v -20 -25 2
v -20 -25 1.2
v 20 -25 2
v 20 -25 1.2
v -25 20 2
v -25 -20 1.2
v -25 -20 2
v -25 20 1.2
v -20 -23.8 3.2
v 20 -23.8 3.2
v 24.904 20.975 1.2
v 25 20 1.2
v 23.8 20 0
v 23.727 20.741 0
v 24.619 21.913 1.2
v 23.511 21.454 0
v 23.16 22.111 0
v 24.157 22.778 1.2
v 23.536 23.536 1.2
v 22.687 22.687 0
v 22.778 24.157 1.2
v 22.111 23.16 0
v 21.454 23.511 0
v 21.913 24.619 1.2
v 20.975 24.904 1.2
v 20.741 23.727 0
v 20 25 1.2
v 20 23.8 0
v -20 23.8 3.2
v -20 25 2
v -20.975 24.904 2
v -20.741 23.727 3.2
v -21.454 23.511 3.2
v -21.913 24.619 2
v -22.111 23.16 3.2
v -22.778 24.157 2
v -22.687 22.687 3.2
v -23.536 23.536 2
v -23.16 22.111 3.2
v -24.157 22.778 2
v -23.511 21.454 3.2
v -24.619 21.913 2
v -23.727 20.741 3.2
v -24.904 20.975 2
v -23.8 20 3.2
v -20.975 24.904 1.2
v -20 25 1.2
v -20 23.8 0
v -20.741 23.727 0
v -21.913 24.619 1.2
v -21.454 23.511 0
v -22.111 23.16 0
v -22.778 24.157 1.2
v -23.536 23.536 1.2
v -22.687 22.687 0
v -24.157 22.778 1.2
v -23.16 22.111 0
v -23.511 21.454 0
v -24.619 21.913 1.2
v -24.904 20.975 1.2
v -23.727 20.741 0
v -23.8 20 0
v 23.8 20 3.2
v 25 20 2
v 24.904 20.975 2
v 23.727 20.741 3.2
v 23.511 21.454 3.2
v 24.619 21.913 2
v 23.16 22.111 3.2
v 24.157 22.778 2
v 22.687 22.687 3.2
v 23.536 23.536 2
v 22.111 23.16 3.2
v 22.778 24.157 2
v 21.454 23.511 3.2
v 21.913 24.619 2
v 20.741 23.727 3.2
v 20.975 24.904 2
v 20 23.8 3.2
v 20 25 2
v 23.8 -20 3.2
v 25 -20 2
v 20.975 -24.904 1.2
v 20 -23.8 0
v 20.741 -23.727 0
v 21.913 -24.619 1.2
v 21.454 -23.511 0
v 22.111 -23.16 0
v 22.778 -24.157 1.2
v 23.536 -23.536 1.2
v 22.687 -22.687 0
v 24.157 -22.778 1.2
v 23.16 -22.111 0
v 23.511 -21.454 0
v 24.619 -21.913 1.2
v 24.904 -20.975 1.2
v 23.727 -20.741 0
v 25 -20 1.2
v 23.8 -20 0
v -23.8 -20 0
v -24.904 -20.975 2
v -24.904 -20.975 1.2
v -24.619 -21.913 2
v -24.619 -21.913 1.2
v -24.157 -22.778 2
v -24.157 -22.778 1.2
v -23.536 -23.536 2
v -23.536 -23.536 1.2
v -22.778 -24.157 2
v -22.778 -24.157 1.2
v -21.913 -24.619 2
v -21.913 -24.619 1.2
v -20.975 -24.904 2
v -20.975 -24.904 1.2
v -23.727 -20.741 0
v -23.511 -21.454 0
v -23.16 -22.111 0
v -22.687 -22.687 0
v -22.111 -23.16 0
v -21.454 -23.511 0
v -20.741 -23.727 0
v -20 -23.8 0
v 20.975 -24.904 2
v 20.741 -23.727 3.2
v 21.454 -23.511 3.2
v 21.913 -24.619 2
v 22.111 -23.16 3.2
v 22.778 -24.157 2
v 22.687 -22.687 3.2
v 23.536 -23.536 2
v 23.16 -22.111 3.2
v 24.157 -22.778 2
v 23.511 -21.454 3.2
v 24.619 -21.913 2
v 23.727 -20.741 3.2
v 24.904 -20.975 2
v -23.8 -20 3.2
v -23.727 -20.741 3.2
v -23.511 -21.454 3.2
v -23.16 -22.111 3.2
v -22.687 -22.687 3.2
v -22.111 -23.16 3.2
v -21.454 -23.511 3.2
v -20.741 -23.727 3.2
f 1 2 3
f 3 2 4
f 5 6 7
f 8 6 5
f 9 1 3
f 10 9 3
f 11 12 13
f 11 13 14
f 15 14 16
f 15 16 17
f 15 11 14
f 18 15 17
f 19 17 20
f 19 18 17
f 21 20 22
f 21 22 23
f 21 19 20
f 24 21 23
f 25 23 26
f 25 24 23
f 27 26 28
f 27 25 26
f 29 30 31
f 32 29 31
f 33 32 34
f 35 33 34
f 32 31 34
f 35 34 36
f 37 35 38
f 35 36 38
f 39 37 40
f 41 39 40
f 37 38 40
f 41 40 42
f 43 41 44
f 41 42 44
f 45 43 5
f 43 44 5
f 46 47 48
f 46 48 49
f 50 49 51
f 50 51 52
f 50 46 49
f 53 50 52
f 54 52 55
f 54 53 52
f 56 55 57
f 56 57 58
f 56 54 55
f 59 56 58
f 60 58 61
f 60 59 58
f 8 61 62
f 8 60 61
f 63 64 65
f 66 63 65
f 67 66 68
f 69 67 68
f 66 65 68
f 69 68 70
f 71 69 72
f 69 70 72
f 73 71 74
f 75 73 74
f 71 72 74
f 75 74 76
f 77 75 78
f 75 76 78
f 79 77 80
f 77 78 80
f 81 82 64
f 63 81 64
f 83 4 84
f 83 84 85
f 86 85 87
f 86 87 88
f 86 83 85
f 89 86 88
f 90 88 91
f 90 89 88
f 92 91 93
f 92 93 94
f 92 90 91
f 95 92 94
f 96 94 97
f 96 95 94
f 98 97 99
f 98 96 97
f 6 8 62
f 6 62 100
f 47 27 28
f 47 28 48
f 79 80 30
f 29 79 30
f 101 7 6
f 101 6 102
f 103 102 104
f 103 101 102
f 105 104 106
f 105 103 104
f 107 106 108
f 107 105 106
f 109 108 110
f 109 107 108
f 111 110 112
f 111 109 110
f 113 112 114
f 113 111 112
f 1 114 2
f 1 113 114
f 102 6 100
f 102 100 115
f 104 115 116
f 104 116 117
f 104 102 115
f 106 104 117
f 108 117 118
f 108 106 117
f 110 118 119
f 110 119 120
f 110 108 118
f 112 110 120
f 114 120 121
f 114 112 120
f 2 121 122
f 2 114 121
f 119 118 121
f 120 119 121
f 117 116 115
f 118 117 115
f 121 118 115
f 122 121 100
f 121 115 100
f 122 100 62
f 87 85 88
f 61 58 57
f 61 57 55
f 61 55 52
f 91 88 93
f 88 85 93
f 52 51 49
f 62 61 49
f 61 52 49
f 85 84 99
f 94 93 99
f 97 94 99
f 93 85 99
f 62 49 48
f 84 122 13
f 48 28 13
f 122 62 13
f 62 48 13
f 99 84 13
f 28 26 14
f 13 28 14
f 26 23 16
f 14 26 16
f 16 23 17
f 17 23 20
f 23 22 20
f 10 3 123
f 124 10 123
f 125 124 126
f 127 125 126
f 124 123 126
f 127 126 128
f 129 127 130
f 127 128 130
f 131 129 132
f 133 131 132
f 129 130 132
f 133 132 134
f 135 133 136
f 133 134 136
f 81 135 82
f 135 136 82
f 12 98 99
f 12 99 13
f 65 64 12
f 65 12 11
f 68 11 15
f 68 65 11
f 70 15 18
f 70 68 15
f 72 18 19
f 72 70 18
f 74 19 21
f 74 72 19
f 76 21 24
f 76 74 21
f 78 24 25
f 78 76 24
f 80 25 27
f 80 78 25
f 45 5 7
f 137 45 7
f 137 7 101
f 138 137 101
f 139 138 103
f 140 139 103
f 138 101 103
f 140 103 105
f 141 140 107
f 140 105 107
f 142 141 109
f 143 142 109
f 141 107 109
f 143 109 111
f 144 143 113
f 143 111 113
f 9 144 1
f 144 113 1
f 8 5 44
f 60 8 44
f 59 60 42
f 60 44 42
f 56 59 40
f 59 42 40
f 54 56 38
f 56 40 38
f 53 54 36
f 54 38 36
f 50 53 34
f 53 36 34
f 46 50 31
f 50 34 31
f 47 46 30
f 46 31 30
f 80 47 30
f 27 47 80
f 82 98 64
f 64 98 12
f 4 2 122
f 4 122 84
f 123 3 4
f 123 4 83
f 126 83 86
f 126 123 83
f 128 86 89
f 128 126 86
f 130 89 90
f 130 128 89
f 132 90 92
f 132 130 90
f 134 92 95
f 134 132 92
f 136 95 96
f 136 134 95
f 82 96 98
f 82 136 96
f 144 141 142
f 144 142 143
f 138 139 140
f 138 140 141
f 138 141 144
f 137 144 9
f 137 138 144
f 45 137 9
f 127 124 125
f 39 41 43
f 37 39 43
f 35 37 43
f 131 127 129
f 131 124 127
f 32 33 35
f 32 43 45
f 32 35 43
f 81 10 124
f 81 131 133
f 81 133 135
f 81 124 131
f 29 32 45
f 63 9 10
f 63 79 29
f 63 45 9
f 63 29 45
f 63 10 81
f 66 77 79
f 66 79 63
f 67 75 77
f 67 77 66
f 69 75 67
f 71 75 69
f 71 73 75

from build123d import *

# Parameters (mm, degrees)
F0_W     = 50
F0_H     = 50
F1_DEPTH = 3.2
F2_R     = 5
F3_SIZE  = 1.2


with BuildPart() as f1:
    # F0 (on Top) → F1 (new body)
    with BuildSketch(Plane.XY):
        Rectangle(F0_W, F0_H)
    extrude(amount=F1_DEPTH)

    # F2
    f2_edges = [f1.edges().sort_by_distance(p)[0] for p in [
        (-25, -25, 1.6),
        (25, -25, 1.6),
        (25, 25, 1.6),
        (-25, 25, 1.6),
    ]]
    fillet(f2_edges, radius=F2_R)

    # F3
    f3_edges = [f1.edges().sort_by_distance(p)[0] for p in [
        (0, -25, 0),
        (-23.535534, -23.535534, 0),
        (23.535534, -23.535534, 0),
        (-25, 0, 0),
        (25, 0, 0),
        (-23.535534, 23.535534, 0),
        (23.535534, 23.535534, 0),
        (0, 25, 0),
        (0, -25, 3.2),
        (-23.535534, -23.535534, 3.2),
        (23.535534, -23.535534, 3.2),
        (-25, 0, 3.2),
        (25, 0, 3.2),
        (-23.535534, 23.535534, 3.2),
        (23.535534, 23.535534, 3.2),
        (0, 25, 3.2),
    ]]
    chamfer(f3_edges, length=F3_SIZE)


solid = f1.part
